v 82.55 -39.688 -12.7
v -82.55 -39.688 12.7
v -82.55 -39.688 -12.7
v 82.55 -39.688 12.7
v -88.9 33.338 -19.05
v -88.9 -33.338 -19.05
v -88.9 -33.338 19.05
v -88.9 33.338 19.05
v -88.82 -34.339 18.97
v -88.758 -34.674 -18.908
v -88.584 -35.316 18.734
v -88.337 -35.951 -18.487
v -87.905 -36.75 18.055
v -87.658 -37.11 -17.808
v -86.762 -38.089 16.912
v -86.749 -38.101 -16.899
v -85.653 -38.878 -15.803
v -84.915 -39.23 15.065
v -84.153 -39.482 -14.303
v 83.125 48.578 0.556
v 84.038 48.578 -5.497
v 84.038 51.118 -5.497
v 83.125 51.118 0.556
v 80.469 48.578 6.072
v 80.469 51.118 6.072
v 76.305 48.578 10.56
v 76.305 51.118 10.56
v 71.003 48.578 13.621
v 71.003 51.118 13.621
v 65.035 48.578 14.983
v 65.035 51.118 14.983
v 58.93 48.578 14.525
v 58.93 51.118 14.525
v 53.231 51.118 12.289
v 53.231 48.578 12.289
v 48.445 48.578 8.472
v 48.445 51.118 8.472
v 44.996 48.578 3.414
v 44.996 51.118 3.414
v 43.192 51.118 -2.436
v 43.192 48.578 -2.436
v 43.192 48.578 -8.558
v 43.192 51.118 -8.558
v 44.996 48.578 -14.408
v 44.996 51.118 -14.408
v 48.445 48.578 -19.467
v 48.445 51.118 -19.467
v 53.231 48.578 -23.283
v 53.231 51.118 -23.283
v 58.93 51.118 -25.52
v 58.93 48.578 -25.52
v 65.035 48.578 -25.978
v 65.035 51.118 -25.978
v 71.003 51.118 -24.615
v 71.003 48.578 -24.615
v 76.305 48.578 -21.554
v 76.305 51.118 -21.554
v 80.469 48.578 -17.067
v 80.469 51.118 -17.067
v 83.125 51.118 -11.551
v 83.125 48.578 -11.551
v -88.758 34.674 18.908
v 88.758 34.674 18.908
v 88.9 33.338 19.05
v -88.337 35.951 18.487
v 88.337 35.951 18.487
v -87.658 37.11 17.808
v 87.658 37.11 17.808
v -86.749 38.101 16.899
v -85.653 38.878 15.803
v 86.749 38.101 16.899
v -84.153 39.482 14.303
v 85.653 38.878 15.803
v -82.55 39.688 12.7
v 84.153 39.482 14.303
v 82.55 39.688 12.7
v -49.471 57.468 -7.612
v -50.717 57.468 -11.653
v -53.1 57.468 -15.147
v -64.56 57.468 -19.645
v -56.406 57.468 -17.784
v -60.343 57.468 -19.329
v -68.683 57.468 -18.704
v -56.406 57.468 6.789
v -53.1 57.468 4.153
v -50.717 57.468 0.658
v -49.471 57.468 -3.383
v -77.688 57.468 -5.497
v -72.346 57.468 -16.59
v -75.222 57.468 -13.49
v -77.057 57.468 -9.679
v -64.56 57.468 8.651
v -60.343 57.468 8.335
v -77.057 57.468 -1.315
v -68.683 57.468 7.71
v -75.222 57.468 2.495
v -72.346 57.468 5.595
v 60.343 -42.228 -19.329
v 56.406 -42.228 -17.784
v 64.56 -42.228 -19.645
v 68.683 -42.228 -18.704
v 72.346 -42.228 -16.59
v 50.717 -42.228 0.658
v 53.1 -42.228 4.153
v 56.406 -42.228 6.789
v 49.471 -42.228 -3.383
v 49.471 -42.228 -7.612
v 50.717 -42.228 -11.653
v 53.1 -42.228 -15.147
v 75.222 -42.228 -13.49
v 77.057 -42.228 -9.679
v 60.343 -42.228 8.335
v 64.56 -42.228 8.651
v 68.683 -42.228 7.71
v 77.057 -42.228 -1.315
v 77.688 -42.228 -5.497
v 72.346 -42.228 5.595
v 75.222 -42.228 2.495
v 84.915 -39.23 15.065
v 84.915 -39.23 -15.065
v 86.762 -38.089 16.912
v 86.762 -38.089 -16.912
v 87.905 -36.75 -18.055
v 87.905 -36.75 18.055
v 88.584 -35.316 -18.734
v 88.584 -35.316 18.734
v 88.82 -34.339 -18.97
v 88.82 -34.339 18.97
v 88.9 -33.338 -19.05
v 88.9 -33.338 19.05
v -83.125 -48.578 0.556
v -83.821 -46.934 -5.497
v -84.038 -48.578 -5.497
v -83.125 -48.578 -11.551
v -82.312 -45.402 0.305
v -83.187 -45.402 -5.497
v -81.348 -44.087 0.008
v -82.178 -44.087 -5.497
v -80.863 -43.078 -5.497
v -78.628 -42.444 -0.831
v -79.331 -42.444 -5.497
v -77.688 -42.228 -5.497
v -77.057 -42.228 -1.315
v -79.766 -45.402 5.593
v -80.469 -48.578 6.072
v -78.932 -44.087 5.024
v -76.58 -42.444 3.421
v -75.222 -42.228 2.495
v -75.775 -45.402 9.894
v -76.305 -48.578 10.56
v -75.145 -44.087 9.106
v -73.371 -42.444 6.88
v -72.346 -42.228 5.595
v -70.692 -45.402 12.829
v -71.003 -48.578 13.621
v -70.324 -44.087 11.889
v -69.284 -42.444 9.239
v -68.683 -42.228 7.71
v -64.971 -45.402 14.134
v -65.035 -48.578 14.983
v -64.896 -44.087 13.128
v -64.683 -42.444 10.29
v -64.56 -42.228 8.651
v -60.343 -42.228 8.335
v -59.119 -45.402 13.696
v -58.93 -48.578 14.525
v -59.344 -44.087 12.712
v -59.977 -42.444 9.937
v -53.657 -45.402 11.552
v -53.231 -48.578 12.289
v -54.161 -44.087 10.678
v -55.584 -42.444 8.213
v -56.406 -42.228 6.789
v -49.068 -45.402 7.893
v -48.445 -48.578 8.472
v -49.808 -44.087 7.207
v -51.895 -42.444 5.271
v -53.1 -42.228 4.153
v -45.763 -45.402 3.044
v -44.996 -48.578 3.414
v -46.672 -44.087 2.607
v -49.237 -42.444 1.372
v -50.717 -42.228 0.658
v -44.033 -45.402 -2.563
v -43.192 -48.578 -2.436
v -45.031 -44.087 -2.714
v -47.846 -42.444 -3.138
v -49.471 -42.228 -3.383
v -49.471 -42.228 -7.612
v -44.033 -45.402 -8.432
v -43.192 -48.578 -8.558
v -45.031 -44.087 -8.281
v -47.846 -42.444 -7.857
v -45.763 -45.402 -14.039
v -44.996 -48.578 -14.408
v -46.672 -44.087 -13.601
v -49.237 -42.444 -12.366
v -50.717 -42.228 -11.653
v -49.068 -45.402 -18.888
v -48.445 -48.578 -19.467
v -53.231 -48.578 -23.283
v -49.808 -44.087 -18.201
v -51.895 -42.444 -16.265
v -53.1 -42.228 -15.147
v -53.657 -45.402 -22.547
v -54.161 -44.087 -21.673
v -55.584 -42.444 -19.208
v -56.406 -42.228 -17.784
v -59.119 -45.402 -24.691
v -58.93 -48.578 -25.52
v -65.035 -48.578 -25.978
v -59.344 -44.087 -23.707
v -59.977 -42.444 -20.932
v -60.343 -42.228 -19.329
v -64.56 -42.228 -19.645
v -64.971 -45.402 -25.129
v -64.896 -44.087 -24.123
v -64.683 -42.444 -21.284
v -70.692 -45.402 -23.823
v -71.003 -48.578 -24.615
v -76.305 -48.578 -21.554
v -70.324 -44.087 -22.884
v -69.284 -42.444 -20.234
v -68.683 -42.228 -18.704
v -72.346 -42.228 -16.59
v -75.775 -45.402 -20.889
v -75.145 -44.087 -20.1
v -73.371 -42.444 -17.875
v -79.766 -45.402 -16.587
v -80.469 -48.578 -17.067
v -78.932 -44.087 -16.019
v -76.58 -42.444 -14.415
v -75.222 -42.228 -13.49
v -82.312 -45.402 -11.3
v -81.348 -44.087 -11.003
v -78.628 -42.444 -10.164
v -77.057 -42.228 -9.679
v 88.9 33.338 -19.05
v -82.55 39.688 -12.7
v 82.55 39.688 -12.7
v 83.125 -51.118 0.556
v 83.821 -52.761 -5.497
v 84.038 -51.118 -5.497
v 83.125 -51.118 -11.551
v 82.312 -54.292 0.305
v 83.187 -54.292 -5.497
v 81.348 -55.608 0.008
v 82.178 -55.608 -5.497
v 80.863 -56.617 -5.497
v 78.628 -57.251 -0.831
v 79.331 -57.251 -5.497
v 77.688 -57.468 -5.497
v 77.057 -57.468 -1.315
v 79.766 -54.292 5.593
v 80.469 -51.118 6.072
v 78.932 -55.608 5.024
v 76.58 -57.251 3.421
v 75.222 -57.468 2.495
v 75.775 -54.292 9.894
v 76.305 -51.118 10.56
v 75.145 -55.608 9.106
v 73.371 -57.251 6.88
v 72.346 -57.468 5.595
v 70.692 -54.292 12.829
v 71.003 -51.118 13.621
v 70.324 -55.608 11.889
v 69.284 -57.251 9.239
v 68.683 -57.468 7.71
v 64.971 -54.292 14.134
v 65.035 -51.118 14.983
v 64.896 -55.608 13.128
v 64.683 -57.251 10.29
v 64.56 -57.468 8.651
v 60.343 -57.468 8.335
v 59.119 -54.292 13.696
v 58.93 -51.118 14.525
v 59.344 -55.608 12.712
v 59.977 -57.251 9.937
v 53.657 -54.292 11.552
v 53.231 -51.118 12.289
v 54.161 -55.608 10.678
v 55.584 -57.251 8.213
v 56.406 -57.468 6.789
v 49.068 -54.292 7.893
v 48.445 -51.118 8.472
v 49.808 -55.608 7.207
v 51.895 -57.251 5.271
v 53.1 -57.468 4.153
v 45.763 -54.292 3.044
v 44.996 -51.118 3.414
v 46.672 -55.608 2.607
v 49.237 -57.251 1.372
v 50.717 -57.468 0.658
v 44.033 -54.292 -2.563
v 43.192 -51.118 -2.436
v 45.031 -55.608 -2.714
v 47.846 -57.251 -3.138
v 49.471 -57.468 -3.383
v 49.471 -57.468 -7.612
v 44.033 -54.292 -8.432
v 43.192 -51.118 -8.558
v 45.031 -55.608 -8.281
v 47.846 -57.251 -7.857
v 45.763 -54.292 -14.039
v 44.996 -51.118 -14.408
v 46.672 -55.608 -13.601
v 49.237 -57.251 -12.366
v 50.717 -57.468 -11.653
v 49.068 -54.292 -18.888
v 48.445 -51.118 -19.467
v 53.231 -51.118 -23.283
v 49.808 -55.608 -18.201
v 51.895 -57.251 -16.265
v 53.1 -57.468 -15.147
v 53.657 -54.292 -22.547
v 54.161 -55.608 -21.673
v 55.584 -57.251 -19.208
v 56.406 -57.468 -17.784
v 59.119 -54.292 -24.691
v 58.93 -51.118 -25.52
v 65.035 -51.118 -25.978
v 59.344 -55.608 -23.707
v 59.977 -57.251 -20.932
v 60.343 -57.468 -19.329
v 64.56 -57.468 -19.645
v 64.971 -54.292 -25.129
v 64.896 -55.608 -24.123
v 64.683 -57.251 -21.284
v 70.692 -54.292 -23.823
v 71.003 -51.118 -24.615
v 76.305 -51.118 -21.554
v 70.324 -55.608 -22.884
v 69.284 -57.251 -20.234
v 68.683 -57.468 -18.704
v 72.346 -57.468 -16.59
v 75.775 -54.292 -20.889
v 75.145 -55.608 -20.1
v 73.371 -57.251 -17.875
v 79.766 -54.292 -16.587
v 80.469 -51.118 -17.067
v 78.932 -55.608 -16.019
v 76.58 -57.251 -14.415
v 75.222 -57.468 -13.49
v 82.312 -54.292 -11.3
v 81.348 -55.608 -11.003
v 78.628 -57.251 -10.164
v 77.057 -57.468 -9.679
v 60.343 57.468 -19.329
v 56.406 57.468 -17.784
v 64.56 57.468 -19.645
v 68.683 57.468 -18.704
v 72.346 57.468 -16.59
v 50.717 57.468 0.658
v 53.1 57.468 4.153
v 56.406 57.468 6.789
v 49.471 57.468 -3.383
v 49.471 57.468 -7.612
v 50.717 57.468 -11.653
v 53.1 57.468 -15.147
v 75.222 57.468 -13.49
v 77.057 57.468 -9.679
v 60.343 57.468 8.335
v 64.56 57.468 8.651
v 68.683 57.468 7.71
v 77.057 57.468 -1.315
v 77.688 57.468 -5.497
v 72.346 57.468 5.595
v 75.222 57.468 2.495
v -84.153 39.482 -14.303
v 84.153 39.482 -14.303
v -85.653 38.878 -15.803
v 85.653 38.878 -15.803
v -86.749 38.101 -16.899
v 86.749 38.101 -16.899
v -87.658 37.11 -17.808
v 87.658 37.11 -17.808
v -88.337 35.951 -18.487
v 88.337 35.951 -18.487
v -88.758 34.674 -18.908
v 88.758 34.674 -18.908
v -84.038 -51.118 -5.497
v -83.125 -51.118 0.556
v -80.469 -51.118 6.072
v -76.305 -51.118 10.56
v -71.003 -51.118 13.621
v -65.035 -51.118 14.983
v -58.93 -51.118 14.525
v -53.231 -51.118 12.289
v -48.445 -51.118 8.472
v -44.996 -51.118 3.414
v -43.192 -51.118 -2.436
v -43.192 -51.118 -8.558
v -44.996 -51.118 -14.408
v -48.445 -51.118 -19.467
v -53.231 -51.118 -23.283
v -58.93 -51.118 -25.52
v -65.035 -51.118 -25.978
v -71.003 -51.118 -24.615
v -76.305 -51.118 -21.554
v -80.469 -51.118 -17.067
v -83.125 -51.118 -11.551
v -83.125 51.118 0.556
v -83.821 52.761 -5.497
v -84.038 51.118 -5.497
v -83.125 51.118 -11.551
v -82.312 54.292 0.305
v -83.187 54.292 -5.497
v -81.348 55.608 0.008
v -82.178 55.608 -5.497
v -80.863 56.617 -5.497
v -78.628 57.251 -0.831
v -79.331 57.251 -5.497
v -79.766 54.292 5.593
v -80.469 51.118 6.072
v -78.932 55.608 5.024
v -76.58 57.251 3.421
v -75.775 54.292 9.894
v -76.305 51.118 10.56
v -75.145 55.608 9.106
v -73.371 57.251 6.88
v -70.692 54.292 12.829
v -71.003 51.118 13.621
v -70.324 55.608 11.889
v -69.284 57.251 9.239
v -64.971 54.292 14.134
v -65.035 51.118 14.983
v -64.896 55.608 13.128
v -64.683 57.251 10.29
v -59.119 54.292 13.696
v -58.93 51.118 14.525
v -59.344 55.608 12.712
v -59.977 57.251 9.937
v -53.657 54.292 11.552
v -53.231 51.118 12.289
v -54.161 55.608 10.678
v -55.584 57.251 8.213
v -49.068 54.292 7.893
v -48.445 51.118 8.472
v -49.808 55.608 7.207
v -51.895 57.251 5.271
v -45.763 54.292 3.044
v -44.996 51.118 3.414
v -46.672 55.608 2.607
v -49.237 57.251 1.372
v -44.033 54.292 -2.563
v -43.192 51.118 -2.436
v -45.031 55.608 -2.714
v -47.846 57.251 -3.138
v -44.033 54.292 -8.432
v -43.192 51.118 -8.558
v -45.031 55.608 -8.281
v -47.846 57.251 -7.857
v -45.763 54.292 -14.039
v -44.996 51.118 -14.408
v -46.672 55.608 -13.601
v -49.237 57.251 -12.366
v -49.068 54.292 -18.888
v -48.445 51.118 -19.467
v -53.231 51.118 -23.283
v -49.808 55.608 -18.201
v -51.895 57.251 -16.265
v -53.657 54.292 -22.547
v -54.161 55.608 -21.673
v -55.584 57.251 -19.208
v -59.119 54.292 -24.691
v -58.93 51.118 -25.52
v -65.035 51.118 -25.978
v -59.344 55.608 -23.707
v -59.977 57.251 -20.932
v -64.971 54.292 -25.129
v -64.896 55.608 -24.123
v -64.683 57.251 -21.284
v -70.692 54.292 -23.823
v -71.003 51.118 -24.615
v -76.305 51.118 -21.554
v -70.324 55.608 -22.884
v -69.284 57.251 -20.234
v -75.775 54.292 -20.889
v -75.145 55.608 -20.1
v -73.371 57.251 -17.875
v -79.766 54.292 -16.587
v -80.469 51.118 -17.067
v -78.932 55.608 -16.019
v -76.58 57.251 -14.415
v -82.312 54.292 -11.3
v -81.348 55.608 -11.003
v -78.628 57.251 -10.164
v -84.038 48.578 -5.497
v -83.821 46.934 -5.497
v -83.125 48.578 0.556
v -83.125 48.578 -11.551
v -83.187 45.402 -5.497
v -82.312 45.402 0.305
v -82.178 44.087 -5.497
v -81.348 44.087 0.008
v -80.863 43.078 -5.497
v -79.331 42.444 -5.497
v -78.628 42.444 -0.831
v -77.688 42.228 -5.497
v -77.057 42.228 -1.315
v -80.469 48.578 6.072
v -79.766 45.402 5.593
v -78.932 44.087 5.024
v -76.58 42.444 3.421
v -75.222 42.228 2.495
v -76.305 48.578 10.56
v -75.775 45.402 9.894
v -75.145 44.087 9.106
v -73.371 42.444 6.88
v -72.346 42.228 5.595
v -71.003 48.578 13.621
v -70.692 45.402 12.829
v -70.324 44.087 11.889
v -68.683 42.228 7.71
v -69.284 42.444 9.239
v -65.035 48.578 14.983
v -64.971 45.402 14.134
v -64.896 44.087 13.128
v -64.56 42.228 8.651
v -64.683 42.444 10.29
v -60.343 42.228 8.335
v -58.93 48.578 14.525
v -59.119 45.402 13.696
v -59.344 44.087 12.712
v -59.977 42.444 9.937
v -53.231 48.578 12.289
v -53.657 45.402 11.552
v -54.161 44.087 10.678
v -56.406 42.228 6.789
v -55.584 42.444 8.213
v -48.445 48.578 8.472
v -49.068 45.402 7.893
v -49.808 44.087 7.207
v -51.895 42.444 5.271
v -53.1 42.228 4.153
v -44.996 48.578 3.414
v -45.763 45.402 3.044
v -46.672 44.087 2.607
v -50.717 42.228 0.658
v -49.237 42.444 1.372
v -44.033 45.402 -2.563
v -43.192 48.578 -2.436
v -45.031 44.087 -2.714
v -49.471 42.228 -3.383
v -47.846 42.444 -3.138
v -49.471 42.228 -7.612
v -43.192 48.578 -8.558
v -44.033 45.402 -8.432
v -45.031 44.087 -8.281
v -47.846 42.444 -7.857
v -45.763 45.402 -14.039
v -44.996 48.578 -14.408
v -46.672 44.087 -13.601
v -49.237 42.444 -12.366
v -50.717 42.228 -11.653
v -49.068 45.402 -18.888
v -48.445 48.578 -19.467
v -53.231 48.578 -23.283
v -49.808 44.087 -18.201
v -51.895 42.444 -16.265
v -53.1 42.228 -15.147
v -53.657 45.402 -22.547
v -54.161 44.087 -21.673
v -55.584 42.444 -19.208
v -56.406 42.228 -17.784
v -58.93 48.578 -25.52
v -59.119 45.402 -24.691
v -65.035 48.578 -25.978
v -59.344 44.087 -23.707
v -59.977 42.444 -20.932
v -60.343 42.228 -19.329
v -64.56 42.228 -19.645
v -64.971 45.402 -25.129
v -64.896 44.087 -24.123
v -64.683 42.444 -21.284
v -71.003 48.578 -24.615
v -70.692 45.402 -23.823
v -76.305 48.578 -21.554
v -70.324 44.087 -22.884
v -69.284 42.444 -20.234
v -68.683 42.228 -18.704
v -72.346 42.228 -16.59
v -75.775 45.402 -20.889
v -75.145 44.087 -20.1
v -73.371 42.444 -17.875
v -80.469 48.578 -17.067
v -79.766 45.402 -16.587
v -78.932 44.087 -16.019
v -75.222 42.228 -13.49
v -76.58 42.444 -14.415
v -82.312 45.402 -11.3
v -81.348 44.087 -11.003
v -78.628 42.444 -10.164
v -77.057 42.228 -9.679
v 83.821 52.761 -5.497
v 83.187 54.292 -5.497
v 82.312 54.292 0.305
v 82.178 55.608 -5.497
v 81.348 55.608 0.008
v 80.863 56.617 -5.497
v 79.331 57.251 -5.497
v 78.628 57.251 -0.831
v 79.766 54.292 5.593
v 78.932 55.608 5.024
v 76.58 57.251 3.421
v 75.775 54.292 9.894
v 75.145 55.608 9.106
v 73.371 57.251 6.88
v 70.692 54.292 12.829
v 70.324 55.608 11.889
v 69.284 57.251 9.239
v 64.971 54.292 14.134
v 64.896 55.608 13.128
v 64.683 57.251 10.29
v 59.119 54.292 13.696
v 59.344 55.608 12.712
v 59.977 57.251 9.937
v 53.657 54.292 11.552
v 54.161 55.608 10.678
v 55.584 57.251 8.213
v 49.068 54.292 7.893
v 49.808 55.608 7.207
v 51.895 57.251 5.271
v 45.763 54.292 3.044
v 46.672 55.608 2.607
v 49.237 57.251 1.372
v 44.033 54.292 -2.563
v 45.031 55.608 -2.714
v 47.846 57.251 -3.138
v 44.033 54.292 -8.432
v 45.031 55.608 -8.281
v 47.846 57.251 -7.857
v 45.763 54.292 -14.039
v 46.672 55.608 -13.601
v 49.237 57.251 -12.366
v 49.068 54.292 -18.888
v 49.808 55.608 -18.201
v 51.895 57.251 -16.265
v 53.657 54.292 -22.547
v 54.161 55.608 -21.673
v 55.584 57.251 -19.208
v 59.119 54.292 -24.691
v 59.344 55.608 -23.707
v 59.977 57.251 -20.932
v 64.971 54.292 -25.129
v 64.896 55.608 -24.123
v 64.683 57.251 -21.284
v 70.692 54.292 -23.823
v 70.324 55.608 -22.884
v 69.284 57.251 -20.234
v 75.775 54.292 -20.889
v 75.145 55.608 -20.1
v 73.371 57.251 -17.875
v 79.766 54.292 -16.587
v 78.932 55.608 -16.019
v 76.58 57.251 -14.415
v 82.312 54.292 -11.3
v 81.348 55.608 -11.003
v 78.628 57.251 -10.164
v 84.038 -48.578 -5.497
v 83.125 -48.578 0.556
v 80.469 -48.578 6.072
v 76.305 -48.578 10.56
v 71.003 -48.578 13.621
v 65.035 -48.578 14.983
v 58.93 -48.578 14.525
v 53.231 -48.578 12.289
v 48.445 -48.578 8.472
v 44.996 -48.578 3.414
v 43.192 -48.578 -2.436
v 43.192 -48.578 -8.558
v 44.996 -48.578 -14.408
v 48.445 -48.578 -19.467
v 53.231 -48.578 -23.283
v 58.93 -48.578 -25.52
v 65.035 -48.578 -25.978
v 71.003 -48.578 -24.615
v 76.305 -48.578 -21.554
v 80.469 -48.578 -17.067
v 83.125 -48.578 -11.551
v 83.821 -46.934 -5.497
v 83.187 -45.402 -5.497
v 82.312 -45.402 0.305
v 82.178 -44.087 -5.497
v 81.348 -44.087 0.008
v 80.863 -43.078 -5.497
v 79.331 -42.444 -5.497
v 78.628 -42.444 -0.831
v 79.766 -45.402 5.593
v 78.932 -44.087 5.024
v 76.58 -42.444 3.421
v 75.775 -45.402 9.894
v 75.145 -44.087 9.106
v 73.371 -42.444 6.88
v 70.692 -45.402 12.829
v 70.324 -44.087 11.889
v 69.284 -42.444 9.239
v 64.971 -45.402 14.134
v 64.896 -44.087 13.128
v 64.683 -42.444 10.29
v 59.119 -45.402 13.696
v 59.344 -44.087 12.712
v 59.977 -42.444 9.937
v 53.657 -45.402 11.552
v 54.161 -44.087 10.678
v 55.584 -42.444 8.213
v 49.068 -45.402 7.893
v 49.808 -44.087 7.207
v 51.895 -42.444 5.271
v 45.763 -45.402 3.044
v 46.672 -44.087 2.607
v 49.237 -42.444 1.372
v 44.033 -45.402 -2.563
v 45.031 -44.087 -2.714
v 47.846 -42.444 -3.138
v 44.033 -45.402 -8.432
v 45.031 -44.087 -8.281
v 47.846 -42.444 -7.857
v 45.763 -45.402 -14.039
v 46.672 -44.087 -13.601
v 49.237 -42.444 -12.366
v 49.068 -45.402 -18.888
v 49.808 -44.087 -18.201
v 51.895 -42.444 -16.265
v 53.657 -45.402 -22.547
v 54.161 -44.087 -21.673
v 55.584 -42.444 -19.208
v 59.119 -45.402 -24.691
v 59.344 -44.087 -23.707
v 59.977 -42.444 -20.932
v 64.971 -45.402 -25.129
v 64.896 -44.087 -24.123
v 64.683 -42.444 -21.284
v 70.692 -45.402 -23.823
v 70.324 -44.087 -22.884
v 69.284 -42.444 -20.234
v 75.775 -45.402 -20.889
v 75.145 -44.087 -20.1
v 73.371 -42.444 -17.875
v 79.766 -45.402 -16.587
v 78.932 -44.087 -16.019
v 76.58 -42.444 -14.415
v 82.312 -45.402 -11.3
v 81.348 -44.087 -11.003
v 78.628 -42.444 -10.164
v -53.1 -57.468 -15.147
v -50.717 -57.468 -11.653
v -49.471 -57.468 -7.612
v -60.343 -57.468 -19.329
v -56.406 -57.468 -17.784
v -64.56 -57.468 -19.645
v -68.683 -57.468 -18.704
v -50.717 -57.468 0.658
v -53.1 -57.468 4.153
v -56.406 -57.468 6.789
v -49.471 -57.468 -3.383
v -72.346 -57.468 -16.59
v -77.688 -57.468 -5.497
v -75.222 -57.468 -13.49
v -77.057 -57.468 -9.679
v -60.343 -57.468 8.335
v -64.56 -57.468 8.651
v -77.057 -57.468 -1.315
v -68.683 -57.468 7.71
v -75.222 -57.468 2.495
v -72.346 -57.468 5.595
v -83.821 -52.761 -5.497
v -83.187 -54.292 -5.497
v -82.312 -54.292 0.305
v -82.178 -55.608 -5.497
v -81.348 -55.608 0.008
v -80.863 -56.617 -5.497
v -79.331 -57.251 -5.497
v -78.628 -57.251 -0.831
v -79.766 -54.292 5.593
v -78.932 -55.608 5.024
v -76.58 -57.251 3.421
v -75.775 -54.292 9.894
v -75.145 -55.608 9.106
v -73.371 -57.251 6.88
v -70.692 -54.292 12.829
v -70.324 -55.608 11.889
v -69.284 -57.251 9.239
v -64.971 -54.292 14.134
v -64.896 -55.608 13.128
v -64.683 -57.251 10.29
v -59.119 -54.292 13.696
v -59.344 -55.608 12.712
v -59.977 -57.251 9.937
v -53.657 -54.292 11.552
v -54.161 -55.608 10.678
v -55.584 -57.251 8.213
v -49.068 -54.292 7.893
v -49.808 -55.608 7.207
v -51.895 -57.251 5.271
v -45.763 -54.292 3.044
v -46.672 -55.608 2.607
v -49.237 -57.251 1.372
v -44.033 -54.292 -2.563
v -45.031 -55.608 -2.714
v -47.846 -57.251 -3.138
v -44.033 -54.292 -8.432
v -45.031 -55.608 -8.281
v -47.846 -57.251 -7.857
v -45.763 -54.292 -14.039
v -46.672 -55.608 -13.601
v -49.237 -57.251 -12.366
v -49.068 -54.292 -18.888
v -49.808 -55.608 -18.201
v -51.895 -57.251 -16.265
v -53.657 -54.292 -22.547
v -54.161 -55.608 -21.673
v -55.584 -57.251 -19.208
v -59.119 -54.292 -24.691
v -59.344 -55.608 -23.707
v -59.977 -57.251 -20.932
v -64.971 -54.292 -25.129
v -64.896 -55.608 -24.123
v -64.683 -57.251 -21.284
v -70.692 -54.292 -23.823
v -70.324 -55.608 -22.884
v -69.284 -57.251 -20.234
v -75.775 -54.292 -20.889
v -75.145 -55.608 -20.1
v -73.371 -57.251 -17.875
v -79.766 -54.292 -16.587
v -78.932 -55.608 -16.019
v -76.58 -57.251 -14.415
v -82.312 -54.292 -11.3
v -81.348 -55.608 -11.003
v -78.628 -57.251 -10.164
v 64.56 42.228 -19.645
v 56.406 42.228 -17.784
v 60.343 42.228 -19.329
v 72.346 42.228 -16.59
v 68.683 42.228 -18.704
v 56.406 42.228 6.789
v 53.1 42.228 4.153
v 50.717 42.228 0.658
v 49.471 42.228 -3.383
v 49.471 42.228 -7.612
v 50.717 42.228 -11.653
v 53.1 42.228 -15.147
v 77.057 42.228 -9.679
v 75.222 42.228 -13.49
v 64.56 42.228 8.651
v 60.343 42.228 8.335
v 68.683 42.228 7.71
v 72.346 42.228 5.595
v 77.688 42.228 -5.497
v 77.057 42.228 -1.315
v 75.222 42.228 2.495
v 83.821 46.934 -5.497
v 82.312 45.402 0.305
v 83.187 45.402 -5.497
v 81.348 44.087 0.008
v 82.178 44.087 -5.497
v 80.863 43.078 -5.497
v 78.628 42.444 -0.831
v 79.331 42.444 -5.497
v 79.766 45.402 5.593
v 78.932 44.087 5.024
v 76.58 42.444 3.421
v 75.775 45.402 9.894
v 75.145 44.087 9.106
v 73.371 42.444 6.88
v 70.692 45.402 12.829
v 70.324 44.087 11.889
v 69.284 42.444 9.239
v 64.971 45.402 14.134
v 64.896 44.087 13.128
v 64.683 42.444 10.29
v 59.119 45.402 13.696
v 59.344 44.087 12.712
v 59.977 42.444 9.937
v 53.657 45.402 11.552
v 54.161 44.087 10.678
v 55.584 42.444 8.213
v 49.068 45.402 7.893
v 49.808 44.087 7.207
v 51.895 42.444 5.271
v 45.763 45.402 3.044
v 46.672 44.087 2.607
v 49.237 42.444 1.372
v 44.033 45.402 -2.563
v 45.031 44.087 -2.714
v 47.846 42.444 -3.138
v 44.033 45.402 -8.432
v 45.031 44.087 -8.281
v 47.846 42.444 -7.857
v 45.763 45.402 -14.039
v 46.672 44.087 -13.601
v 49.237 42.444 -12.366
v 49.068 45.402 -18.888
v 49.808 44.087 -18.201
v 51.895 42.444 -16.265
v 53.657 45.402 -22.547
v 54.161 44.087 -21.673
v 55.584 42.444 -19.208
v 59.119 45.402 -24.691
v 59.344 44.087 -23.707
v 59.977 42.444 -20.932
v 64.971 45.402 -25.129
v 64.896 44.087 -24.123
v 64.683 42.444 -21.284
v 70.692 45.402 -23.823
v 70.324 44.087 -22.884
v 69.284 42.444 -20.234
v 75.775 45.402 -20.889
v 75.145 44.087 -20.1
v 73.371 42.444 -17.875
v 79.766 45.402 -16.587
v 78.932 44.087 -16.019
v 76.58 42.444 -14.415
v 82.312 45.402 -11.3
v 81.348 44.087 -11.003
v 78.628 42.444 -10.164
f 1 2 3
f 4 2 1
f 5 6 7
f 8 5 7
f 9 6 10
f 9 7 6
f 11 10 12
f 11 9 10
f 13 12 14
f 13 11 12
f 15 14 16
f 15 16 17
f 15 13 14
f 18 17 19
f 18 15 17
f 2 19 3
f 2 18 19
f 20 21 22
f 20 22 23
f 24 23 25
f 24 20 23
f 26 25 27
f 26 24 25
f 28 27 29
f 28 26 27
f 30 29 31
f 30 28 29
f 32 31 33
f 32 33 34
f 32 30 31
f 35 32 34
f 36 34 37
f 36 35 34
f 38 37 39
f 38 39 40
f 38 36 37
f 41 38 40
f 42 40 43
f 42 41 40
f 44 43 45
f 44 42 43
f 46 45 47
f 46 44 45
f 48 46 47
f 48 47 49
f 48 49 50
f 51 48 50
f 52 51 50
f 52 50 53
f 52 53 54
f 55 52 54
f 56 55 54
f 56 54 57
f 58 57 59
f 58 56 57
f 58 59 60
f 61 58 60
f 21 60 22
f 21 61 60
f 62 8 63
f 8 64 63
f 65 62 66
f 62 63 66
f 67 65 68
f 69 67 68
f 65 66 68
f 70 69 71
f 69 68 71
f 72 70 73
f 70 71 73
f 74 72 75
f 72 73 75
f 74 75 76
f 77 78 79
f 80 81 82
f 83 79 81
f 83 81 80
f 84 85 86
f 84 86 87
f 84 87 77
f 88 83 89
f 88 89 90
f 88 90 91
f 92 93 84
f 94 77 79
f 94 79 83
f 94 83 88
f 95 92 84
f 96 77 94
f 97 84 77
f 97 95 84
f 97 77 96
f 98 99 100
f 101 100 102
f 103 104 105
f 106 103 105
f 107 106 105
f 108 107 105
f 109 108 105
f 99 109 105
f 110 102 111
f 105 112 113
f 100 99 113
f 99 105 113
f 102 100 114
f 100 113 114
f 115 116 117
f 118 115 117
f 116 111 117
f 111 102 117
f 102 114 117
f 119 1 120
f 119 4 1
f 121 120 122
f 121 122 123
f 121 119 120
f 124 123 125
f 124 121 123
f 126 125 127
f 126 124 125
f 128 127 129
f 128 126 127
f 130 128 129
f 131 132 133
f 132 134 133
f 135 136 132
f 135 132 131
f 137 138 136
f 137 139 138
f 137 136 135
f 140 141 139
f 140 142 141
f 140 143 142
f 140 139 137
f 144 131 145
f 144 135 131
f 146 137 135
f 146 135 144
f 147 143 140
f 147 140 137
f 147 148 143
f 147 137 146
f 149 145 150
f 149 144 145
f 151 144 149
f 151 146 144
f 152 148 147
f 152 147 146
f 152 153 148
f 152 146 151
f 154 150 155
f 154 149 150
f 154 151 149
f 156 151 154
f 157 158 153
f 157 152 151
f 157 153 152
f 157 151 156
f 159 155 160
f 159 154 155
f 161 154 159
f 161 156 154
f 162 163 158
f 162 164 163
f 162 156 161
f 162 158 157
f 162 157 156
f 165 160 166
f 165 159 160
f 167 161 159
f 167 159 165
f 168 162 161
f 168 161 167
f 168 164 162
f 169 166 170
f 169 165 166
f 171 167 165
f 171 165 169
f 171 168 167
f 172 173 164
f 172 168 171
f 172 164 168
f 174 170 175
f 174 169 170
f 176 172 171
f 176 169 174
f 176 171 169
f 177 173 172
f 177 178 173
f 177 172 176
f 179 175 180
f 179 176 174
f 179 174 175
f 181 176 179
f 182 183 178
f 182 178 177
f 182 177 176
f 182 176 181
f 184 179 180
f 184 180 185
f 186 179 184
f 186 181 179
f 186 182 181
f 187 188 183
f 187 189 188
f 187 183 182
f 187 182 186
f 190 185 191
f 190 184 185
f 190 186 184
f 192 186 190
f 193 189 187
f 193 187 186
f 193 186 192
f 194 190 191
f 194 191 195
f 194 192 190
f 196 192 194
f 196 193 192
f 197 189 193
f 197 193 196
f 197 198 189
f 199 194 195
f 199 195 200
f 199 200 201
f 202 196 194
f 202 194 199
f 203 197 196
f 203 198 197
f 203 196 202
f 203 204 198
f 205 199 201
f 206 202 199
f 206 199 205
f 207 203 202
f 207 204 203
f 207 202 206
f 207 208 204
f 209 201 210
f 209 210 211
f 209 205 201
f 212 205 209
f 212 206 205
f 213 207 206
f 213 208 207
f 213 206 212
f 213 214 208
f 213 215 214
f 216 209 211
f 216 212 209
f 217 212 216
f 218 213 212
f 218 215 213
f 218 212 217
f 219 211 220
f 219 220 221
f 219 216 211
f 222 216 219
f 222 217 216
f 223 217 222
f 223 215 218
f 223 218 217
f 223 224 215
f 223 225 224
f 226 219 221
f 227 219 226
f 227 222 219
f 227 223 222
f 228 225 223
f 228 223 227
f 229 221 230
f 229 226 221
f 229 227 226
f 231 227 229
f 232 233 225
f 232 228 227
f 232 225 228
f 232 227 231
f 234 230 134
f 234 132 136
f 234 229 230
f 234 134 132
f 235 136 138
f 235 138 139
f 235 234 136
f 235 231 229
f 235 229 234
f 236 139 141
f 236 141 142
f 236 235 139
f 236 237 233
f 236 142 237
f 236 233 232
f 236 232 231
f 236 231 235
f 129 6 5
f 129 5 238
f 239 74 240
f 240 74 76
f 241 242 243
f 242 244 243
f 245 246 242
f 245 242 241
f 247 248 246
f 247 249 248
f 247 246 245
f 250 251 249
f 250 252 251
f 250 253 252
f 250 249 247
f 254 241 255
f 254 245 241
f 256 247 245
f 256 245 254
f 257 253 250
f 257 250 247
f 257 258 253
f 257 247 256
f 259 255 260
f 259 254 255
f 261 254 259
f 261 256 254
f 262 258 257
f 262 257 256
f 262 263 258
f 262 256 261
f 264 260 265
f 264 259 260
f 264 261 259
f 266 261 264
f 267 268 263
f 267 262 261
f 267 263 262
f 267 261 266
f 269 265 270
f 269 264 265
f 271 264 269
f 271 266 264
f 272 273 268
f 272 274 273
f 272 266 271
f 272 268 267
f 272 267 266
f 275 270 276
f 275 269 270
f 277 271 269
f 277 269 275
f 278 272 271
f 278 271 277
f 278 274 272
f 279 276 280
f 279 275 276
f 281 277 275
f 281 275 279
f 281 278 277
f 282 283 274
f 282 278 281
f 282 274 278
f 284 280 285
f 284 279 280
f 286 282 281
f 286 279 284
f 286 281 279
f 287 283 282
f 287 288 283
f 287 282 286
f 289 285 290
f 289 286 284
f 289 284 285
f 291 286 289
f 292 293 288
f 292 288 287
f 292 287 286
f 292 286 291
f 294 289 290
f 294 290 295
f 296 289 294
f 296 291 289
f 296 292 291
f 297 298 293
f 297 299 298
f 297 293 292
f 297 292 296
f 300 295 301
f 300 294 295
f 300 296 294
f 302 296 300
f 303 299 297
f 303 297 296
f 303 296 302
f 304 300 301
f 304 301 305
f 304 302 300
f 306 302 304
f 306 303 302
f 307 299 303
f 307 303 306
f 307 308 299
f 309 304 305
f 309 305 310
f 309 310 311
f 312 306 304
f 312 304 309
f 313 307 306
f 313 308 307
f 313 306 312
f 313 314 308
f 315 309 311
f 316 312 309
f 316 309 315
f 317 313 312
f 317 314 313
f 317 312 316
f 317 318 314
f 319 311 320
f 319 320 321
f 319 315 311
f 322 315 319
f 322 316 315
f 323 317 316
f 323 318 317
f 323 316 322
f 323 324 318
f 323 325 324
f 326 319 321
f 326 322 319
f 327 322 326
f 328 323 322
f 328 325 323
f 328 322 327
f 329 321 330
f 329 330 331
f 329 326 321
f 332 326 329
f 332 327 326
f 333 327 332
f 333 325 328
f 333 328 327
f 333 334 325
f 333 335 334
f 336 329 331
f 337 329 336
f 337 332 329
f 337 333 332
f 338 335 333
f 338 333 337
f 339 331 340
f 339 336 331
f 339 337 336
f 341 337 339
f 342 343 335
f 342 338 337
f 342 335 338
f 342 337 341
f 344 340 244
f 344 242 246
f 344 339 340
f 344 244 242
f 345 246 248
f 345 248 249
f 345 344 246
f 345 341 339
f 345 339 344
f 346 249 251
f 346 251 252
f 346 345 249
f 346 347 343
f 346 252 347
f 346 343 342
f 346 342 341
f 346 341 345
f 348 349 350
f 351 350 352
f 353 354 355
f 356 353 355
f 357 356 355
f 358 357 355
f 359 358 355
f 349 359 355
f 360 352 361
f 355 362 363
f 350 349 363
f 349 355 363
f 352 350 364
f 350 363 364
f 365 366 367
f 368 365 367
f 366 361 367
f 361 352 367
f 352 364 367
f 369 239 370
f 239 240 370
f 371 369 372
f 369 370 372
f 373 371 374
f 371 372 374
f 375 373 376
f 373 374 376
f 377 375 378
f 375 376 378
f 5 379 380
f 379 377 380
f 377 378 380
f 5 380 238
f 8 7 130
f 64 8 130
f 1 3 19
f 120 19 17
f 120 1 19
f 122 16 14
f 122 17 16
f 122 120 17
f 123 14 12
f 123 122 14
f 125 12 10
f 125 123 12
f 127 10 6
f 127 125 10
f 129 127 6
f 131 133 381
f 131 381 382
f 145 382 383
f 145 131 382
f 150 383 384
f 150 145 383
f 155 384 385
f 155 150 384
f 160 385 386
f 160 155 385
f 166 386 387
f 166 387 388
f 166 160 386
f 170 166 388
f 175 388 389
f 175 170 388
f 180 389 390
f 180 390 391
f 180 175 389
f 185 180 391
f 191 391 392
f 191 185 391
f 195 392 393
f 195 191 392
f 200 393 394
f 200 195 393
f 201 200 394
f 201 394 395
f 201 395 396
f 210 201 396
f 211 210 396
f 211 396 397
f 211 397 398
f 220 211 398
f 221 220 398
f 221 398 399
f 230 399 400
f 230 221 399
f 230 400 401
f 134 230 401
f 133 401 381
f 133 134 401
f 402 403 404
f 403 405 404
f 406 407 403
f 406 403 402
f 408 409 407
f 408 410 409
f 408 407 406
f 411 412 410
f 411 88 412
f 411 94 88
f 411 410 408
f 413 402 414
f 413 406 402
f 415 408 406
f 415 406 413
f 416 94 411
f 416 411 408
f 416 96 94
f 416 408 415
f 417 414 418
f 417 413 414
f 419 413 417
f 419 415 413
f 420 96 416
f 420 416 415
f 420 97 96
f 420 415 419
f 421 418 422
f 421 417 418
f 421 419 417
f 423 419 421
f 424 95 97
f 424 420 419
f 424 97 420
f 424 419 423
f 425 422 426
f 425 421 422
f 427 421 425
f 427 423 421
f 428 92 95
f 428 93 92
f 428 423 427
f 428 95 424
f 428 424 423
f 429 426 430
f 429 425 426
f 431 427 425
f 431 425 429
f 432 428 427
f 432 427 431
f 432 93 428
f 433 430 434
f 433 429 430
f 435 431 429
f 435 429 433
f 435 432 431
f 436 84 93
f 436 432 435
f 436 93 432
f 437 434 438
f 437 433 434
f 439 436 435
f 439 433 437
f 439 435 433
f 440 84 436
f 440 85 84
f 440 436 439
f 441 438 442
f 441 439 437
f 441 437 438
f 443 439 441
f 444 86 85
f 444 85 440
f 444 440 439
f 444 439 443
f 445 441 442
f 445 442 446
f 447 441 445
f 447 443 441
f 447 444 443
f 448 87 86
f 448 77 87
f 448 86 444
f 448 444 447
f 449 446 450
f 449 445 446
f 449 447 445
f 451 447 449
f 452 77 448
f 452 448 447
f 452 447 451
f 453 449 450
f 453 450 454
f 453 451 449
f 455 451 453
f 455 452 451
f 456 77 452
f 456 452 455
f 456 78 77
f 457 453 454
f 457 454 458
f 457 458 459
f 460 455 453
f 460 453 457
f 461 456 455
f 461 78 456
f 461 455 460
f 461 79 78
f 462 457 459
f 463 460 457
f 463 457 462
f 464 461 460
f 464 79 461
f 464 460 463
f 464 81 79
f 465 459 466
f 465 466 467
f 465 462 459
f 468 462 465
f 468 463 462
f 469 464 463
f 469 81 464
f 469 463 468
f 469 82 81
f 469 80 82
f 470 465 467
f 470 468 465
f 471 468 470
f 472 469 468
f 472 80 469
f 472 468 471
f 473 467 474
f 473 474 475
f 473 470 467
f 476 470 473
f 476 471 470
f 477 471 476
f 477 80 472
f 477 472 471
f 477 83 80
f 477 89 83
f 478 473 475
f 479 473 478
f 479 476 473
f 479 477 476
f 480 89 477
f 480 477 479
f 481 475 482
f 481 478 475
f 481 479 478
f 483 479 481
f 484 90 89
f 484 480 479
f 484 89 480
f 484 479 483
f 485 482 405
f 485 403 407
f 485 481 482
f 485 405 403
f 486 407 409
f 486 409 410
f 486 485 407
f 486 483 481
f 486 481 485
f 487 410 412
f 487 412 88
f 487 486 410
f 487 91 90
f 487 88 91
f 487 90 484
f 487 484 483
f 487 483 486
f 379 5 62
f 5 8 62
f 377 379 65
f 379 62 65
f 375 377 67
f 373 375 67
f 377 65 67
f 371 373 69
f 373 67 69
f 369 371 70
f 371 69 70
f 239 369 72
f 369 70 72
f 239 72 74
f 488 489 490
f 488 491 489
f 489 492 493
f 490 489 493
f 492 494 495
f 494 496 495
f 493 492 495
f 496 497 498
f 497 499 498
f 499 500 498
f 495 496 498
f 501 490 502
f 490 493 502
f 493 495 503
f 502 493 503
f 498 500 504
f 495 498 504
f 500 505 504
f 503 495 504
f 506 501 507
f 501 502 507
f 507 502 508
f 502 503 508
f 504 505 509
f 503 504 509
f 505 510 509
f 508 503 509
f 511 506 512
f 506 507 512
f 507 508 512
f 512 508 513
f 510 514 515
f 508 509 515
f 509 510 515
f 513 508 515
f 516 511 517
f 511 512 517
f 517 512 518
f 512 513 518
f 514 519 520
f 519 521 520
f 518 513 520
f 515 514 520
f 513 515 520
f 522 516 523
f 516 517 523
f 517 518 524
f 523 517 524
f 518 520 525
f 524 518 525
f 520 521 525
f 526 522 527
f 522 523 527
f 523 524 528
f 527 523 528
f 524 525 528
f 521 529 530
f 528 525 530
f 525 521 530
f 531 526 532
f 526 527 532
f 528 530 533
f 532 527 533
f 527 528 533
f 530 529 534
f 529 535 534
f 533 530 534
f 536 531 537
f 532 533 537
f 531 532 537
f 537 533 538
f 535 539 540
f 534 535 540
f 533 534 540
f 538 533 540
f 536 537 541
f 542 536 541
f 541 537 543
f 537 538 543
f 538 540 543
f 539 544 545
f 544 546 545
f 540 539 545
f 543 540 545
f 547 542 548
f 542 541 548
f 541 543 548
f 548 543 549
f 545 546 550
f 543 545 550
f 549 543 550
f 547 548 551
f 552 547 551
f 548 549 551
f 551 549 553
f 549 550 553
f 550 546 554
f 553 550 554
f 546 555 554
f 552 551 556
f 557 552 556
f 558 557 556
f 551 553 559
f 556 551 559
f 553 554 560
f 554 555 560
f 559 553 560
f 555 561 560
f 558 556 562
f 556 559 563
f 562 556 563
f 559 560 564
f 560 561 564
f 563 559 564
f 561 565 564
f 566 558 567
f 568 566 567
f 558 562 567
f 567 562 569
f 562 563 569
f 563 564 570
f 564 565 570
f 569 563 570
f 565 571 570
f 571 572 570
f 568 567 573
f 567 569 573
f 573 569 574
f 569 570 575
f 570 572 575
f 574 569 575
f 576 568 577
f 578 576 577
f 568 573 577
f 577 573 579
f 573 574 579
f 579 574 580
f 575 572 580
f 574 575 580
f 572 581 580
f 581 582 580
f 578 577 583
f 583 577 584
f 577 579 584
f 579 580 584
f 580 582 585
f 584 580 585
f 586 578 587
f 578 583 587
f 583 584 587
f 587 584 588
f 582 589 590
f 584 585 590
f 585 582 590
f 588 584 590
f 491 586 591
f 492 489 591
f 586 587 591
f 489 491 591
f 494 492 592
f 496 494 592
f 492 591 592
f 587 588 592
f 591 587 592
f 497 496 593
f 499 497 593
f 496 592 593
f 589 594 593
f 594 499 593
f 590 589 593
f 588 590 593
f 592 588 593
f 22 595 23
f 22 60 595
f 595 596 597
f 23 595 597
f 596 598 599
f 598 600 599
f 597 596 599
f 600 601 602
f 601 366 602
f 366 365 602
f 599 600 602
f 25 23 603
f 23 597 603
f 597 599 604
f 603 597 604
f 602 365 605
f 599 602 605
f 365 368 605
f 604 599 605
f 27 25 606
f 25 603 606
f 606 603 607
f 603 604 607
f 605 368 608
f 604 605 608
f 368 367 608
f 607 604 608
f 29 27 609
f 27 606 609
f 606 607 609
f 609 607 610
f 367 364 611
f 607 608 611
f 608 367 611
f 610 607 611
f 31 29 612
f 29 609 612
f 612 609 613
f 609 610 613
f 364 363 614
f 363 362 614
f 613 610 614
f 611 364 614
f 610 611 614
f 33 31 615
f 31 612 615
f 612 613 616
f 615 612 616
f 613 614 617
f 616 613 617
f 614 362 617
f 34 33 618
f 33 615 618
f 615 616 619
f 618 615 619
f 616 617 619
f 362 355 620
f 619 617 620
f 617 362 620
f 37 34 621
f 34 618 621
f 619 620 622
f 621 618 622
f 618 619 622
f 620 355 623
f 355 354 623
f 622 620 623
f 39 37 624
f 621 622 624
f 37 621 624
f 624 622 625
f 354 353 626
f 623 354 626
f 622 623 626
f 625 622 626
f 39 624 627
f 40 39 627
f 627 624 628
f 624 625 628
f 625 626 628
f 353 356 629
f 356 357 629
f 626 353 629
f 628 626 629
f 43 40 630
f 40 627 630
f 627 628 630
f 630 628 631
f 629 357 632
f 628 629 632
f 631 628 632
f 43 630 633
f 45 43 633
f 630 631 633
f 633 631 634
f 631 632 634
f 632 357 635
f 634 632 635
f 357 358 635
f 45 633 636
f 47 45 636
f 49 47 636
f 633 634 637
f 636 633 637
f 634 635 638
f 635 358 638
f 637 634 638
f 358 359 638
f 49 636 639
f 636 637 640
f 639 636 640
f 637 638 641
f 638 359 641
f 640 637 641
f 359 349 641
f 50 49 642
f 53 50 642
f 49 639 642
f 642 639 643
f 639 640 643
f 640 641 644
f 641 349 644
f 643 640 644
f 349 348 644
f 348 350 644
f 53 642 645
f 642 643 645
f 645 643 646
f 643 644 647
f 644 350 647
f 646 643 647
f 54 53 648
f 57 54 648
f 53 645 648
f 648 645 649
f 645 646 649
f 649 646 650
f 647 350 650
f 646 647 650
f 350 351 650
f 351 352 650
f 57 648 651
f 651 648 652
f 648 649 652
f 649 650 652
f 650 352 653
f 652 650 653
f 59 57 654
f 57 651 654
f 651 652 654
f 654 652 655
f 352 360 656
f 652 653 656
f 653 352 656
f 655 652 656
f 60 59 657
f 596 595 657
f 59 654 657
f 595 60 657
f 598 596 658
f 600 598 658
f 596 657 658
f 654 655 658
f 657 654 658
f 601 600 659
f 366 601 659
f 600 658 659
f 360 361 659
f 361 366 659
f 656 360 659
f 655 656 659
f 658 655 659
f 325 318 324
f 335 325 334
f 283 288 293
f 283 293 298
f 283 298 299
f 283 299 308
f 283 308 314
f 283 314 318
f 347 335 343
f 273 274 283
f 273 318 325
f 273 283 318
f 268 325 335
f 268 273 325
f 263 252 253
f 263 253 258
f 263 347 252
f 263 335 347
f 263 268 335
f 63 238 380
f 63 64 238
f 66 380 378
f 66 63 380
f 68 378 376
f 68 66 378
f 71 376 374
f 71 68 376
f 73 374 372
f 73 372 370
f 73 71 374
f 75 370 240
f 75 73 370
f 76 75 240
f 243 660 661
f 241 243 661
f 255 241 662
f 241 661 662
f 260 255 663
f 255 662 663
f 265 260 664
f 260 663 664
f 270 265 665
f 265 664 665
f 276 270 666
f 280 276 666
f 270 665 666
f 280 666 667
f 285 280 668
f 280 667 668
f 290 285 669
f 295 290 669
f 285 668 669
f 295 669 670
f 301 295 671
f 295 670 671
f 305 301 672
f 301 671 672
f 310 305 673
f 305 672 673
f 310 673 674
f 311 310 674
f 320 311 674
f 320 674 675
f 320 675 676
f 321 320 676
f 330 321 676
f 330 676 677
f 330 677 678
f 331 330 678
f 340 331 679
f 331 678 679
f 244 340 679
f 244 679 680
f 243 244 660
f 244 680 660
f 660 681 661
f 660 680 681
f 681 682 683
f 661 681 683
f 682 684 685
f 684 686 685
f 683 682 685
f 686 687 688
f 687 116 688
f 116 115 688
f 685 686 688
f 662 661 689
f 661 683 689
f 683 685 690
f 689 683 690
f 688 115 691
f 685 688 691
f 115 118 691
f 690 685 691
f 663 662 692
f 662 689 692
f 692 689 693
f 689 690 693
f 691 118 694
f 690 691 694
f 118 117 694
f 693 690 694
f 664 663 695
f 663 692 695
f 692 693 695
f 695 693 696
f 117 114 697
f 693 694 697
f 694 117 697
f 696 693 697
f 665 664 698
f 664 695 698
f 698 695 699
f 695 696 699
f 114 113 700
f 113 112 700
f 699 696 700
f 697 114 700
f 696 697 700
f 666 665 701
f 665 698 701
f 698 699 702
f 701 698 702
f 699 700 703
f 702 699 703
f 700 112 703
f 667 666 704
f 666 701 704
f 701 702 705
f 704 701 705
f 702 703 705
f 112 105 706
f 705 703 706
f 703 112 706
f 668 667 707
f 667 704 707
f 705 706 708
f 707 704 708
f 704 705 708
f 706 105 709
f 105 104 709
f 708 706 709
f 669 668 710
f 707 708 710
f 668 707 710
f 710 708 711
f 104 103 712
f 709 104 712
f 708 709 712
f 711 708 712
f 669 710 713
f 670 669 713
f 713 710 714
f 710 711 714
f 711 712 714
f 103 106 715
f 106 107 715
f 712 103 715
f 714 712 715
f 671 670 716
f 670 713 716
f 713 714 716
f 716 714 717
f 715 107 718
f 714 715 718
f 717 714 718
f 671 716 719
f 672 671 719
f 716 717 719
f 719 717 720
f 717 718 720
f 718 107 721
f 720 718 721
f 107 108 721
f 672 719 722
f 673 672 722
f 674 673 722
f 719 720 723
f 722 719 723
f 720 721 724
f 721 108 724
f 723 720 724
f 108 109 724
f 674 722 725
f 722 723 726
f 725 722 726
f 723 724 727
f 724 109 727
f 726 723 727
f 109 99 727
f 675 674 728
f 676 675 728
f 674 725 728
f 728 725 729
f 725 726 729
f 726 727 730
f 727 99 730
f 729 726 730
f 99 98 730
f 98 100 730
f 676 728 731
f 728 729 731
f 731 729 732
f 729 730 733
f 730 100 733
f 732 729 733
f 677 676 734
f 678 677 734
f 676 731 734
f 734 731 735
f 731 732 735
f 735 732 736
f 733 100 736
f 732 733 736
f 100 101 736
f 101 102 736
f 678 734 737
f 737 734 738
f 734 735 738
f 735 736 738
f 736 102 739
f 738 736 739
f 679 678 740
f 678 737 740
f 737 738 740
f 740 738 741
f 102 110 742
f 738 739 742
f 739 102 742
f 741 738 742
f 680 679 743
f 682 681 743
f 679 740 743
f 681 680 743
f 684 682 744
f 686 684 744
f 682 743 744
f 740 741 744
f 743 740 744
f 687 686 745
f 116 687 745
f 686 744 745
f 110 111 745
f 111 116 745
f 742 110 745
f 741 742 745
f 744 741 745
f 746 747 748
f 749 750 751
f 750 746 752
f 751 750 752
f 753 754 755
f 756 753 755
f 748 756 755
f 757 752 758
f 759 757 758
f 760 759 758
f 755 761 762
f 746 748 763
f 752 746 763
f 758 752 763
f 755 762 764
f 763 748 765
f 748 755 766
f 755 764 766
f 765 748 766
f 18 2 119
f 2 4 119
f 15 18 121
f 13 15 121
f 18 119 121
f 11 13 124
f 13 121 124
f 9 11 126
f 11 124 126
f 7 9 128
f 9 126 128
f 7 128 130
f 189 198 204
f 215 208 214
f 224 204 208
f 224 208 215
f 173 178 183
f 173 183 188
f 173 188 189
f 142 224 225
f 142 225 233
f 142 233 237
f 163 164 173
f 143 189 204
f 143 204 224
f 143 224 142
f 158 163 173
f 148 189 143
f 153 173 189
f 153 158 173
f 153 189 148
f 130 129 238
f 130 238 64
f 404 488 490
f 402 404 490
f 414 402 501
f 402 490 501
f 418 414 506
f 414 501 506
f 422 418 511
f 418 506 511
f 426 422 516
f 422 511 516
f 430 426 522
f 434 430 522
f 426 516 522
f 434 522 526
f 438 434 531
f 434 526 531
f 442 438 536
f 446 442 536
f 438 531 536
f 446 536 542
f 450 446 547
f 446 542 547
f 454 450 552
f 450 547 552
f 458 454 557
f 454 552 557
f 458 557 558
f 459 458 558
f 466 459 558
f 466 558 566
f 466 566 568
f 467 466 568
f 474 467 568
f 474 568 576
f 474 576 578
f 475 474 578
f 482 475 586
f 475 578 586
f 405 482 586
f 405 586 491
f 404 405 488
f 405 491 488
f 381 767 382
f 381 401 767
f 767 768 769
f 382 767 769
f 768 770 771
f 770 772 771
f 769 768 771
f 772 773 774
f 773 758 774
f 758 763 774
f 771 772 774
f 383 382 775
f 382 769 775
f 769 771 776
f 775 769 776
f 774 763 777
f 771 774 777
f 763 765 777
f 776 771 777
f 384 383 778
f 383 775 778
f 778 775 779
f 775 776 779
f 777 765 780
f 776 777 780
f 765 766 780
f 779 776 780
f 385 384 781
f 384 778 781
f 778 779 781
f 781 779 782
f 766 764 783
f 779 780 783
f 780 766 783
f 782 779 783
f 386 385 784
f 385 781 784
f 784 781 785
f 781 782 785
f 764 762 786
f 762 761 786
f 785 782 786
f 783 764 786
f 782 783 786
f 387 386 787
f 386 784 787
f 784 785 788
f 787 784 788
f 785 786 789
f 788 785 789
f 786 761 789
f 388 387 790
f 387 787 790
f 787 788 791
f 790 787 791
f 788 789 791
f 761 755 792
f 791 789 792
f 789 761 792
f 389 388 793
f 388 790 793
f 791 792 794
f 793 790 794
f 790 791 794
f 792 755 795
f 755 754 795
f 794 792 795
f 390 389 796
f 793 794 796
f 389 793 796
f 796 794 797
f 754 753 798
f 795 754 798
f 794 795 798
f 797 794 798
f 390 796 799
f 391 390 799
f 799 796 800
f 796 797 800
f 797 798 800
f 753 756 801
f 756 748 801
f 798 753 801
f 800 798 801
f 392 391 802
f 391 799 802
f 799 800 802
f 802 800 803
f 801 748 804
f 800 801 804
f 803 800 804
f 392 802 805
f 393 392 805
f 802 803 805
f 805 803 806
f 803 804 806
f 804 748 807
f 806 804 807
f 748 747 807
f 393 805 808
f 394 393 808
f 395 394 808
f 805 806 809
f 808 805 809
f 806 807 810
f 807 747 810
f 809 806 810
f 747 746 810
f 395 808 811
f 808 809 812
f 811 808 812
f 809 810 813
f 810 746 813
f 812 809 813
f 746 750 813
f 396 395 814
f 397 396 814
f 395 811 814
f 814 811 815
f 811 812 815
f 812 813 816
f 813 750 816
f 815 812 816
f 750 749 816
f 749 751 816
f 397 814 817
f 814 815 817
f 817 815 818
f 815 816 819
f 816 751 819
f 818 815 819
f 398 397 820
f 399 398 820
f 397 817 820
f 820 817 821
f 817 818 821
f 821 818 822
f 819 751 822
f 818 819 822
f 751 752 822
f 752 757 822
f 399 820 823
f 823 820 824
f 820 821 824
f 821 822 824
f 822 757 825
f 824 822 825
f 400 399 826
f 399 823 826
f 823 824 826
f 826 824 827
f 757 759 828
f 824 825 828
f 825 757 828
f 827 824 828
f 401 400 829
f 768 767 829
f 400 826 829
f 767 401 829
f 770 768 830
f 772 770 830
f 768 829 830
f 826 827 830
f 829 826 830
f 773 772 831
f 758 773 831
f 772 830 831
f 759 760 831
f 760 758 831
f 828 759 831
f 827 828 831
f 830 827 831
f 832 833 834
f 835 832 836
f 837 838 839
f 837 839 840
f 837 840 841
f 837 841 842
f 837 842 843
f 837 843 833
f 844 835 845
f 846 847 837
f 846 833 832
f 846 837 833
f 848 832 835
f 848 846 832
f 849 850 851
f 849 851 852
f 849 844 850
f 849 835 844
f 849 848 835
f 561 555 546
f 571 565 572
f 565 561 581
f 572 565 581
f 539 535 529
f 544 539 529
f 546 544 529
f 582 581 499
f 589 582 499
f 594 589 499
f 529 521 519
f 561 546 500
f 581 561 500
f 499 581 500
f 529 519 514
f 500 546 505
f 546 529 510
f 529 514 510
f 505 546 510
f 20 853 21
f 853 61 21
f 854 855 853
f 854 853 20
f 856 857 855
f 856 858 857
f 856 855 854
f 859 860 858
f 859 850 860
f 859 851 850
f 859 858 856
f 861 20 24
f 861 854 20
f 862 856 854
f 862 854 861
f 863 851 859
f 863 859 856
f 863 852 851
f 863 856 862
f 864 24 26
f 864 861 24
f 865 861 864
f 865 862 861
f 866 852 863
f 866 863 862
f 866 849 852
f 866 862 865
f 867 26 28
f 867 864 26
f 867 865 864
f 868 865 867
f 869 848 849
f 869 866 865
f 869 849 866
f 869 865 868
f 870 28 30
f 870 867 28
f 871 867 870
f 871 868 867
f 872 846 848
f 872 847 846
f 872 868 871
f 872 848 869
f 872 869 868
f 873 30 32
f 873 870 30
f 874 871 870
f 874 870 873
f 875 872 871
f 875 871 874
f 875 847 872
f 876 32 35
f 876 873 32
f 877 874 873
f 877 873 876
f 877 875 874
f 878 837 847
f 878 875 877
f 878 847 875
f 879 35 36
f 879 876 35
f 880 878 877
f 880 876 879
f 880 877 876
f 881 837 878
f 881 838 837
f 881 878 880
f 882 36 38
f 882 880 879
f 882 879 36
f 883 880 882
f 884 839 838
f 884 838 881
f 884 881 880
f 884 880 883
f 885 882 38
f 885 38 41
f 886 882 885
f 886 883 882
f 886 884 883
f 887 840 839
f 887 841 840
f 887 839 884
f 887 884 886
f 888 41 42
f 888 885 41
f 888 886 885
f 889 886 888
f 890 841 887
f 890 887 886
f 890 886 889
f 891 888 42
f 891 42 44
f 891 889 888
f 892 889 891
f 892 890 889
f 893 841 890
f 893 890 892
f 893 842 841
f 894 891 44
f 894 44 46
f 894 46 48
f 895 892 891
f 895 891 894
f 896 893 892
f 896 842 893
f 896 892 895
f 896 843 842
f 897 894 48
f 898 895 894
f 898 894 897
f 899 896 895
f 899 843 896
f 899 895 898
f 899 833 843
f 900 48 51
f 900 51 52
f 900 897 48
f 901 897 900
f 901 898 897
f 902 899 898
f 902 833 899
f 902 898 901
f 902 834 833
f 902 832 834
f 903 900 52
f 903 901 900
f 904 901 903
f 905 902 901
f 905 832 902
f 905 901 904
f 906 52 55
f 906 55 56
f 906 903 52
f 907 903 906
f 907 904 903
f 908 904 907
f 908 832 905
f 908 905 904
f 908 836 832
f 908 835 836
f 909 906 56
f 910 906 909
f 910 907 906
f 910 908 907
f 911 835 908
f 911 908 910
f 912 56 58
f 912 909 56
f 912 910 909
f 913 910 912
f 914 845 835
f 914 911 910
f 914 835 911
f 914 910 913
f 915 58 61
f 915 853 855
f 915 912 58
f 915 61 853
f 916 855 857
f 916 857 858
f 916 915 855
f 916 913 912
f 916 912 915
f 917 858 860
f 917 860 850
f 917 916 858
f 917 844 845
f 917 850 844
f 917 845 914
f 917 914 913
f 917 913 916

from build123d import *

# Parameters (mm, degrees)
F1_W     = 177.8
F1_H     = 38.1
F2_DEPTH = 39.6875
F4_R     = 20.537641
F5_DEPTH = 15.24
F6_R     = 6.35
F8_R     = 6.35


with BuildPart() as f2:
    # F1 (on Front) → F2 (new body, symmetric)
    with BuildSketch(Plane.XZ):
        Rectangle(F1_W, F1_H)
    extrude(amount=F2_DEPTH, both=True)

    # F8
    f8_edges = [f2.edges().sort_by_distance(p)[0] for p in [
        (88.9, -39.6875, 0),
        (0, -39.6875, 19.05),
        (-88.9, -39.6875, 0),
        (0, -39.6875, -19.05),
        (88.9, 39.6875, 0),
        (0, 39.6875, 19.05),
        (-88.9, 39.6875, 0),
        (0, 39.6875, -19.05),
    ]]
    fillet(f8_edges, radius=F8_R)


with BuildPart() as f5:
    # F4 (on offset) → F5 (new body)
    with BuildSketch(Plane.XZ.offset(42.2275)):
        with Locations((63.5, -5.497359)):
            Circle(F4_R)
    extrude(amount=F5_DEPTH)

    # F6
    f6_edges = [f5.edges().sort_by_distance(p)[0] for p in [
        (84.037641, -49.8475, -5.497359),
        (42.962359, -42.2275, -5.497359),
        (42.962359, -57.4675, -5.497359),
    ]]
    fillet(f6_edges, radius=F6_R)


with BuildPart() as f7_1:
    # F7: instance of F5
    add(f5.part.mirror(Plane.XZ))


with BuildPart() as f9_1:
    # F9: instance of F5
    add(f5.part.mirror(Plane.YZ))


with BuildPart() as f9_2:
    # F9: instance of F7_1
    add(f7_1.part.mirror(Plane.YZ))


solid = Compound([f2.part, f5.part, f7_1.part, f9_1.part, f9_2.part])
